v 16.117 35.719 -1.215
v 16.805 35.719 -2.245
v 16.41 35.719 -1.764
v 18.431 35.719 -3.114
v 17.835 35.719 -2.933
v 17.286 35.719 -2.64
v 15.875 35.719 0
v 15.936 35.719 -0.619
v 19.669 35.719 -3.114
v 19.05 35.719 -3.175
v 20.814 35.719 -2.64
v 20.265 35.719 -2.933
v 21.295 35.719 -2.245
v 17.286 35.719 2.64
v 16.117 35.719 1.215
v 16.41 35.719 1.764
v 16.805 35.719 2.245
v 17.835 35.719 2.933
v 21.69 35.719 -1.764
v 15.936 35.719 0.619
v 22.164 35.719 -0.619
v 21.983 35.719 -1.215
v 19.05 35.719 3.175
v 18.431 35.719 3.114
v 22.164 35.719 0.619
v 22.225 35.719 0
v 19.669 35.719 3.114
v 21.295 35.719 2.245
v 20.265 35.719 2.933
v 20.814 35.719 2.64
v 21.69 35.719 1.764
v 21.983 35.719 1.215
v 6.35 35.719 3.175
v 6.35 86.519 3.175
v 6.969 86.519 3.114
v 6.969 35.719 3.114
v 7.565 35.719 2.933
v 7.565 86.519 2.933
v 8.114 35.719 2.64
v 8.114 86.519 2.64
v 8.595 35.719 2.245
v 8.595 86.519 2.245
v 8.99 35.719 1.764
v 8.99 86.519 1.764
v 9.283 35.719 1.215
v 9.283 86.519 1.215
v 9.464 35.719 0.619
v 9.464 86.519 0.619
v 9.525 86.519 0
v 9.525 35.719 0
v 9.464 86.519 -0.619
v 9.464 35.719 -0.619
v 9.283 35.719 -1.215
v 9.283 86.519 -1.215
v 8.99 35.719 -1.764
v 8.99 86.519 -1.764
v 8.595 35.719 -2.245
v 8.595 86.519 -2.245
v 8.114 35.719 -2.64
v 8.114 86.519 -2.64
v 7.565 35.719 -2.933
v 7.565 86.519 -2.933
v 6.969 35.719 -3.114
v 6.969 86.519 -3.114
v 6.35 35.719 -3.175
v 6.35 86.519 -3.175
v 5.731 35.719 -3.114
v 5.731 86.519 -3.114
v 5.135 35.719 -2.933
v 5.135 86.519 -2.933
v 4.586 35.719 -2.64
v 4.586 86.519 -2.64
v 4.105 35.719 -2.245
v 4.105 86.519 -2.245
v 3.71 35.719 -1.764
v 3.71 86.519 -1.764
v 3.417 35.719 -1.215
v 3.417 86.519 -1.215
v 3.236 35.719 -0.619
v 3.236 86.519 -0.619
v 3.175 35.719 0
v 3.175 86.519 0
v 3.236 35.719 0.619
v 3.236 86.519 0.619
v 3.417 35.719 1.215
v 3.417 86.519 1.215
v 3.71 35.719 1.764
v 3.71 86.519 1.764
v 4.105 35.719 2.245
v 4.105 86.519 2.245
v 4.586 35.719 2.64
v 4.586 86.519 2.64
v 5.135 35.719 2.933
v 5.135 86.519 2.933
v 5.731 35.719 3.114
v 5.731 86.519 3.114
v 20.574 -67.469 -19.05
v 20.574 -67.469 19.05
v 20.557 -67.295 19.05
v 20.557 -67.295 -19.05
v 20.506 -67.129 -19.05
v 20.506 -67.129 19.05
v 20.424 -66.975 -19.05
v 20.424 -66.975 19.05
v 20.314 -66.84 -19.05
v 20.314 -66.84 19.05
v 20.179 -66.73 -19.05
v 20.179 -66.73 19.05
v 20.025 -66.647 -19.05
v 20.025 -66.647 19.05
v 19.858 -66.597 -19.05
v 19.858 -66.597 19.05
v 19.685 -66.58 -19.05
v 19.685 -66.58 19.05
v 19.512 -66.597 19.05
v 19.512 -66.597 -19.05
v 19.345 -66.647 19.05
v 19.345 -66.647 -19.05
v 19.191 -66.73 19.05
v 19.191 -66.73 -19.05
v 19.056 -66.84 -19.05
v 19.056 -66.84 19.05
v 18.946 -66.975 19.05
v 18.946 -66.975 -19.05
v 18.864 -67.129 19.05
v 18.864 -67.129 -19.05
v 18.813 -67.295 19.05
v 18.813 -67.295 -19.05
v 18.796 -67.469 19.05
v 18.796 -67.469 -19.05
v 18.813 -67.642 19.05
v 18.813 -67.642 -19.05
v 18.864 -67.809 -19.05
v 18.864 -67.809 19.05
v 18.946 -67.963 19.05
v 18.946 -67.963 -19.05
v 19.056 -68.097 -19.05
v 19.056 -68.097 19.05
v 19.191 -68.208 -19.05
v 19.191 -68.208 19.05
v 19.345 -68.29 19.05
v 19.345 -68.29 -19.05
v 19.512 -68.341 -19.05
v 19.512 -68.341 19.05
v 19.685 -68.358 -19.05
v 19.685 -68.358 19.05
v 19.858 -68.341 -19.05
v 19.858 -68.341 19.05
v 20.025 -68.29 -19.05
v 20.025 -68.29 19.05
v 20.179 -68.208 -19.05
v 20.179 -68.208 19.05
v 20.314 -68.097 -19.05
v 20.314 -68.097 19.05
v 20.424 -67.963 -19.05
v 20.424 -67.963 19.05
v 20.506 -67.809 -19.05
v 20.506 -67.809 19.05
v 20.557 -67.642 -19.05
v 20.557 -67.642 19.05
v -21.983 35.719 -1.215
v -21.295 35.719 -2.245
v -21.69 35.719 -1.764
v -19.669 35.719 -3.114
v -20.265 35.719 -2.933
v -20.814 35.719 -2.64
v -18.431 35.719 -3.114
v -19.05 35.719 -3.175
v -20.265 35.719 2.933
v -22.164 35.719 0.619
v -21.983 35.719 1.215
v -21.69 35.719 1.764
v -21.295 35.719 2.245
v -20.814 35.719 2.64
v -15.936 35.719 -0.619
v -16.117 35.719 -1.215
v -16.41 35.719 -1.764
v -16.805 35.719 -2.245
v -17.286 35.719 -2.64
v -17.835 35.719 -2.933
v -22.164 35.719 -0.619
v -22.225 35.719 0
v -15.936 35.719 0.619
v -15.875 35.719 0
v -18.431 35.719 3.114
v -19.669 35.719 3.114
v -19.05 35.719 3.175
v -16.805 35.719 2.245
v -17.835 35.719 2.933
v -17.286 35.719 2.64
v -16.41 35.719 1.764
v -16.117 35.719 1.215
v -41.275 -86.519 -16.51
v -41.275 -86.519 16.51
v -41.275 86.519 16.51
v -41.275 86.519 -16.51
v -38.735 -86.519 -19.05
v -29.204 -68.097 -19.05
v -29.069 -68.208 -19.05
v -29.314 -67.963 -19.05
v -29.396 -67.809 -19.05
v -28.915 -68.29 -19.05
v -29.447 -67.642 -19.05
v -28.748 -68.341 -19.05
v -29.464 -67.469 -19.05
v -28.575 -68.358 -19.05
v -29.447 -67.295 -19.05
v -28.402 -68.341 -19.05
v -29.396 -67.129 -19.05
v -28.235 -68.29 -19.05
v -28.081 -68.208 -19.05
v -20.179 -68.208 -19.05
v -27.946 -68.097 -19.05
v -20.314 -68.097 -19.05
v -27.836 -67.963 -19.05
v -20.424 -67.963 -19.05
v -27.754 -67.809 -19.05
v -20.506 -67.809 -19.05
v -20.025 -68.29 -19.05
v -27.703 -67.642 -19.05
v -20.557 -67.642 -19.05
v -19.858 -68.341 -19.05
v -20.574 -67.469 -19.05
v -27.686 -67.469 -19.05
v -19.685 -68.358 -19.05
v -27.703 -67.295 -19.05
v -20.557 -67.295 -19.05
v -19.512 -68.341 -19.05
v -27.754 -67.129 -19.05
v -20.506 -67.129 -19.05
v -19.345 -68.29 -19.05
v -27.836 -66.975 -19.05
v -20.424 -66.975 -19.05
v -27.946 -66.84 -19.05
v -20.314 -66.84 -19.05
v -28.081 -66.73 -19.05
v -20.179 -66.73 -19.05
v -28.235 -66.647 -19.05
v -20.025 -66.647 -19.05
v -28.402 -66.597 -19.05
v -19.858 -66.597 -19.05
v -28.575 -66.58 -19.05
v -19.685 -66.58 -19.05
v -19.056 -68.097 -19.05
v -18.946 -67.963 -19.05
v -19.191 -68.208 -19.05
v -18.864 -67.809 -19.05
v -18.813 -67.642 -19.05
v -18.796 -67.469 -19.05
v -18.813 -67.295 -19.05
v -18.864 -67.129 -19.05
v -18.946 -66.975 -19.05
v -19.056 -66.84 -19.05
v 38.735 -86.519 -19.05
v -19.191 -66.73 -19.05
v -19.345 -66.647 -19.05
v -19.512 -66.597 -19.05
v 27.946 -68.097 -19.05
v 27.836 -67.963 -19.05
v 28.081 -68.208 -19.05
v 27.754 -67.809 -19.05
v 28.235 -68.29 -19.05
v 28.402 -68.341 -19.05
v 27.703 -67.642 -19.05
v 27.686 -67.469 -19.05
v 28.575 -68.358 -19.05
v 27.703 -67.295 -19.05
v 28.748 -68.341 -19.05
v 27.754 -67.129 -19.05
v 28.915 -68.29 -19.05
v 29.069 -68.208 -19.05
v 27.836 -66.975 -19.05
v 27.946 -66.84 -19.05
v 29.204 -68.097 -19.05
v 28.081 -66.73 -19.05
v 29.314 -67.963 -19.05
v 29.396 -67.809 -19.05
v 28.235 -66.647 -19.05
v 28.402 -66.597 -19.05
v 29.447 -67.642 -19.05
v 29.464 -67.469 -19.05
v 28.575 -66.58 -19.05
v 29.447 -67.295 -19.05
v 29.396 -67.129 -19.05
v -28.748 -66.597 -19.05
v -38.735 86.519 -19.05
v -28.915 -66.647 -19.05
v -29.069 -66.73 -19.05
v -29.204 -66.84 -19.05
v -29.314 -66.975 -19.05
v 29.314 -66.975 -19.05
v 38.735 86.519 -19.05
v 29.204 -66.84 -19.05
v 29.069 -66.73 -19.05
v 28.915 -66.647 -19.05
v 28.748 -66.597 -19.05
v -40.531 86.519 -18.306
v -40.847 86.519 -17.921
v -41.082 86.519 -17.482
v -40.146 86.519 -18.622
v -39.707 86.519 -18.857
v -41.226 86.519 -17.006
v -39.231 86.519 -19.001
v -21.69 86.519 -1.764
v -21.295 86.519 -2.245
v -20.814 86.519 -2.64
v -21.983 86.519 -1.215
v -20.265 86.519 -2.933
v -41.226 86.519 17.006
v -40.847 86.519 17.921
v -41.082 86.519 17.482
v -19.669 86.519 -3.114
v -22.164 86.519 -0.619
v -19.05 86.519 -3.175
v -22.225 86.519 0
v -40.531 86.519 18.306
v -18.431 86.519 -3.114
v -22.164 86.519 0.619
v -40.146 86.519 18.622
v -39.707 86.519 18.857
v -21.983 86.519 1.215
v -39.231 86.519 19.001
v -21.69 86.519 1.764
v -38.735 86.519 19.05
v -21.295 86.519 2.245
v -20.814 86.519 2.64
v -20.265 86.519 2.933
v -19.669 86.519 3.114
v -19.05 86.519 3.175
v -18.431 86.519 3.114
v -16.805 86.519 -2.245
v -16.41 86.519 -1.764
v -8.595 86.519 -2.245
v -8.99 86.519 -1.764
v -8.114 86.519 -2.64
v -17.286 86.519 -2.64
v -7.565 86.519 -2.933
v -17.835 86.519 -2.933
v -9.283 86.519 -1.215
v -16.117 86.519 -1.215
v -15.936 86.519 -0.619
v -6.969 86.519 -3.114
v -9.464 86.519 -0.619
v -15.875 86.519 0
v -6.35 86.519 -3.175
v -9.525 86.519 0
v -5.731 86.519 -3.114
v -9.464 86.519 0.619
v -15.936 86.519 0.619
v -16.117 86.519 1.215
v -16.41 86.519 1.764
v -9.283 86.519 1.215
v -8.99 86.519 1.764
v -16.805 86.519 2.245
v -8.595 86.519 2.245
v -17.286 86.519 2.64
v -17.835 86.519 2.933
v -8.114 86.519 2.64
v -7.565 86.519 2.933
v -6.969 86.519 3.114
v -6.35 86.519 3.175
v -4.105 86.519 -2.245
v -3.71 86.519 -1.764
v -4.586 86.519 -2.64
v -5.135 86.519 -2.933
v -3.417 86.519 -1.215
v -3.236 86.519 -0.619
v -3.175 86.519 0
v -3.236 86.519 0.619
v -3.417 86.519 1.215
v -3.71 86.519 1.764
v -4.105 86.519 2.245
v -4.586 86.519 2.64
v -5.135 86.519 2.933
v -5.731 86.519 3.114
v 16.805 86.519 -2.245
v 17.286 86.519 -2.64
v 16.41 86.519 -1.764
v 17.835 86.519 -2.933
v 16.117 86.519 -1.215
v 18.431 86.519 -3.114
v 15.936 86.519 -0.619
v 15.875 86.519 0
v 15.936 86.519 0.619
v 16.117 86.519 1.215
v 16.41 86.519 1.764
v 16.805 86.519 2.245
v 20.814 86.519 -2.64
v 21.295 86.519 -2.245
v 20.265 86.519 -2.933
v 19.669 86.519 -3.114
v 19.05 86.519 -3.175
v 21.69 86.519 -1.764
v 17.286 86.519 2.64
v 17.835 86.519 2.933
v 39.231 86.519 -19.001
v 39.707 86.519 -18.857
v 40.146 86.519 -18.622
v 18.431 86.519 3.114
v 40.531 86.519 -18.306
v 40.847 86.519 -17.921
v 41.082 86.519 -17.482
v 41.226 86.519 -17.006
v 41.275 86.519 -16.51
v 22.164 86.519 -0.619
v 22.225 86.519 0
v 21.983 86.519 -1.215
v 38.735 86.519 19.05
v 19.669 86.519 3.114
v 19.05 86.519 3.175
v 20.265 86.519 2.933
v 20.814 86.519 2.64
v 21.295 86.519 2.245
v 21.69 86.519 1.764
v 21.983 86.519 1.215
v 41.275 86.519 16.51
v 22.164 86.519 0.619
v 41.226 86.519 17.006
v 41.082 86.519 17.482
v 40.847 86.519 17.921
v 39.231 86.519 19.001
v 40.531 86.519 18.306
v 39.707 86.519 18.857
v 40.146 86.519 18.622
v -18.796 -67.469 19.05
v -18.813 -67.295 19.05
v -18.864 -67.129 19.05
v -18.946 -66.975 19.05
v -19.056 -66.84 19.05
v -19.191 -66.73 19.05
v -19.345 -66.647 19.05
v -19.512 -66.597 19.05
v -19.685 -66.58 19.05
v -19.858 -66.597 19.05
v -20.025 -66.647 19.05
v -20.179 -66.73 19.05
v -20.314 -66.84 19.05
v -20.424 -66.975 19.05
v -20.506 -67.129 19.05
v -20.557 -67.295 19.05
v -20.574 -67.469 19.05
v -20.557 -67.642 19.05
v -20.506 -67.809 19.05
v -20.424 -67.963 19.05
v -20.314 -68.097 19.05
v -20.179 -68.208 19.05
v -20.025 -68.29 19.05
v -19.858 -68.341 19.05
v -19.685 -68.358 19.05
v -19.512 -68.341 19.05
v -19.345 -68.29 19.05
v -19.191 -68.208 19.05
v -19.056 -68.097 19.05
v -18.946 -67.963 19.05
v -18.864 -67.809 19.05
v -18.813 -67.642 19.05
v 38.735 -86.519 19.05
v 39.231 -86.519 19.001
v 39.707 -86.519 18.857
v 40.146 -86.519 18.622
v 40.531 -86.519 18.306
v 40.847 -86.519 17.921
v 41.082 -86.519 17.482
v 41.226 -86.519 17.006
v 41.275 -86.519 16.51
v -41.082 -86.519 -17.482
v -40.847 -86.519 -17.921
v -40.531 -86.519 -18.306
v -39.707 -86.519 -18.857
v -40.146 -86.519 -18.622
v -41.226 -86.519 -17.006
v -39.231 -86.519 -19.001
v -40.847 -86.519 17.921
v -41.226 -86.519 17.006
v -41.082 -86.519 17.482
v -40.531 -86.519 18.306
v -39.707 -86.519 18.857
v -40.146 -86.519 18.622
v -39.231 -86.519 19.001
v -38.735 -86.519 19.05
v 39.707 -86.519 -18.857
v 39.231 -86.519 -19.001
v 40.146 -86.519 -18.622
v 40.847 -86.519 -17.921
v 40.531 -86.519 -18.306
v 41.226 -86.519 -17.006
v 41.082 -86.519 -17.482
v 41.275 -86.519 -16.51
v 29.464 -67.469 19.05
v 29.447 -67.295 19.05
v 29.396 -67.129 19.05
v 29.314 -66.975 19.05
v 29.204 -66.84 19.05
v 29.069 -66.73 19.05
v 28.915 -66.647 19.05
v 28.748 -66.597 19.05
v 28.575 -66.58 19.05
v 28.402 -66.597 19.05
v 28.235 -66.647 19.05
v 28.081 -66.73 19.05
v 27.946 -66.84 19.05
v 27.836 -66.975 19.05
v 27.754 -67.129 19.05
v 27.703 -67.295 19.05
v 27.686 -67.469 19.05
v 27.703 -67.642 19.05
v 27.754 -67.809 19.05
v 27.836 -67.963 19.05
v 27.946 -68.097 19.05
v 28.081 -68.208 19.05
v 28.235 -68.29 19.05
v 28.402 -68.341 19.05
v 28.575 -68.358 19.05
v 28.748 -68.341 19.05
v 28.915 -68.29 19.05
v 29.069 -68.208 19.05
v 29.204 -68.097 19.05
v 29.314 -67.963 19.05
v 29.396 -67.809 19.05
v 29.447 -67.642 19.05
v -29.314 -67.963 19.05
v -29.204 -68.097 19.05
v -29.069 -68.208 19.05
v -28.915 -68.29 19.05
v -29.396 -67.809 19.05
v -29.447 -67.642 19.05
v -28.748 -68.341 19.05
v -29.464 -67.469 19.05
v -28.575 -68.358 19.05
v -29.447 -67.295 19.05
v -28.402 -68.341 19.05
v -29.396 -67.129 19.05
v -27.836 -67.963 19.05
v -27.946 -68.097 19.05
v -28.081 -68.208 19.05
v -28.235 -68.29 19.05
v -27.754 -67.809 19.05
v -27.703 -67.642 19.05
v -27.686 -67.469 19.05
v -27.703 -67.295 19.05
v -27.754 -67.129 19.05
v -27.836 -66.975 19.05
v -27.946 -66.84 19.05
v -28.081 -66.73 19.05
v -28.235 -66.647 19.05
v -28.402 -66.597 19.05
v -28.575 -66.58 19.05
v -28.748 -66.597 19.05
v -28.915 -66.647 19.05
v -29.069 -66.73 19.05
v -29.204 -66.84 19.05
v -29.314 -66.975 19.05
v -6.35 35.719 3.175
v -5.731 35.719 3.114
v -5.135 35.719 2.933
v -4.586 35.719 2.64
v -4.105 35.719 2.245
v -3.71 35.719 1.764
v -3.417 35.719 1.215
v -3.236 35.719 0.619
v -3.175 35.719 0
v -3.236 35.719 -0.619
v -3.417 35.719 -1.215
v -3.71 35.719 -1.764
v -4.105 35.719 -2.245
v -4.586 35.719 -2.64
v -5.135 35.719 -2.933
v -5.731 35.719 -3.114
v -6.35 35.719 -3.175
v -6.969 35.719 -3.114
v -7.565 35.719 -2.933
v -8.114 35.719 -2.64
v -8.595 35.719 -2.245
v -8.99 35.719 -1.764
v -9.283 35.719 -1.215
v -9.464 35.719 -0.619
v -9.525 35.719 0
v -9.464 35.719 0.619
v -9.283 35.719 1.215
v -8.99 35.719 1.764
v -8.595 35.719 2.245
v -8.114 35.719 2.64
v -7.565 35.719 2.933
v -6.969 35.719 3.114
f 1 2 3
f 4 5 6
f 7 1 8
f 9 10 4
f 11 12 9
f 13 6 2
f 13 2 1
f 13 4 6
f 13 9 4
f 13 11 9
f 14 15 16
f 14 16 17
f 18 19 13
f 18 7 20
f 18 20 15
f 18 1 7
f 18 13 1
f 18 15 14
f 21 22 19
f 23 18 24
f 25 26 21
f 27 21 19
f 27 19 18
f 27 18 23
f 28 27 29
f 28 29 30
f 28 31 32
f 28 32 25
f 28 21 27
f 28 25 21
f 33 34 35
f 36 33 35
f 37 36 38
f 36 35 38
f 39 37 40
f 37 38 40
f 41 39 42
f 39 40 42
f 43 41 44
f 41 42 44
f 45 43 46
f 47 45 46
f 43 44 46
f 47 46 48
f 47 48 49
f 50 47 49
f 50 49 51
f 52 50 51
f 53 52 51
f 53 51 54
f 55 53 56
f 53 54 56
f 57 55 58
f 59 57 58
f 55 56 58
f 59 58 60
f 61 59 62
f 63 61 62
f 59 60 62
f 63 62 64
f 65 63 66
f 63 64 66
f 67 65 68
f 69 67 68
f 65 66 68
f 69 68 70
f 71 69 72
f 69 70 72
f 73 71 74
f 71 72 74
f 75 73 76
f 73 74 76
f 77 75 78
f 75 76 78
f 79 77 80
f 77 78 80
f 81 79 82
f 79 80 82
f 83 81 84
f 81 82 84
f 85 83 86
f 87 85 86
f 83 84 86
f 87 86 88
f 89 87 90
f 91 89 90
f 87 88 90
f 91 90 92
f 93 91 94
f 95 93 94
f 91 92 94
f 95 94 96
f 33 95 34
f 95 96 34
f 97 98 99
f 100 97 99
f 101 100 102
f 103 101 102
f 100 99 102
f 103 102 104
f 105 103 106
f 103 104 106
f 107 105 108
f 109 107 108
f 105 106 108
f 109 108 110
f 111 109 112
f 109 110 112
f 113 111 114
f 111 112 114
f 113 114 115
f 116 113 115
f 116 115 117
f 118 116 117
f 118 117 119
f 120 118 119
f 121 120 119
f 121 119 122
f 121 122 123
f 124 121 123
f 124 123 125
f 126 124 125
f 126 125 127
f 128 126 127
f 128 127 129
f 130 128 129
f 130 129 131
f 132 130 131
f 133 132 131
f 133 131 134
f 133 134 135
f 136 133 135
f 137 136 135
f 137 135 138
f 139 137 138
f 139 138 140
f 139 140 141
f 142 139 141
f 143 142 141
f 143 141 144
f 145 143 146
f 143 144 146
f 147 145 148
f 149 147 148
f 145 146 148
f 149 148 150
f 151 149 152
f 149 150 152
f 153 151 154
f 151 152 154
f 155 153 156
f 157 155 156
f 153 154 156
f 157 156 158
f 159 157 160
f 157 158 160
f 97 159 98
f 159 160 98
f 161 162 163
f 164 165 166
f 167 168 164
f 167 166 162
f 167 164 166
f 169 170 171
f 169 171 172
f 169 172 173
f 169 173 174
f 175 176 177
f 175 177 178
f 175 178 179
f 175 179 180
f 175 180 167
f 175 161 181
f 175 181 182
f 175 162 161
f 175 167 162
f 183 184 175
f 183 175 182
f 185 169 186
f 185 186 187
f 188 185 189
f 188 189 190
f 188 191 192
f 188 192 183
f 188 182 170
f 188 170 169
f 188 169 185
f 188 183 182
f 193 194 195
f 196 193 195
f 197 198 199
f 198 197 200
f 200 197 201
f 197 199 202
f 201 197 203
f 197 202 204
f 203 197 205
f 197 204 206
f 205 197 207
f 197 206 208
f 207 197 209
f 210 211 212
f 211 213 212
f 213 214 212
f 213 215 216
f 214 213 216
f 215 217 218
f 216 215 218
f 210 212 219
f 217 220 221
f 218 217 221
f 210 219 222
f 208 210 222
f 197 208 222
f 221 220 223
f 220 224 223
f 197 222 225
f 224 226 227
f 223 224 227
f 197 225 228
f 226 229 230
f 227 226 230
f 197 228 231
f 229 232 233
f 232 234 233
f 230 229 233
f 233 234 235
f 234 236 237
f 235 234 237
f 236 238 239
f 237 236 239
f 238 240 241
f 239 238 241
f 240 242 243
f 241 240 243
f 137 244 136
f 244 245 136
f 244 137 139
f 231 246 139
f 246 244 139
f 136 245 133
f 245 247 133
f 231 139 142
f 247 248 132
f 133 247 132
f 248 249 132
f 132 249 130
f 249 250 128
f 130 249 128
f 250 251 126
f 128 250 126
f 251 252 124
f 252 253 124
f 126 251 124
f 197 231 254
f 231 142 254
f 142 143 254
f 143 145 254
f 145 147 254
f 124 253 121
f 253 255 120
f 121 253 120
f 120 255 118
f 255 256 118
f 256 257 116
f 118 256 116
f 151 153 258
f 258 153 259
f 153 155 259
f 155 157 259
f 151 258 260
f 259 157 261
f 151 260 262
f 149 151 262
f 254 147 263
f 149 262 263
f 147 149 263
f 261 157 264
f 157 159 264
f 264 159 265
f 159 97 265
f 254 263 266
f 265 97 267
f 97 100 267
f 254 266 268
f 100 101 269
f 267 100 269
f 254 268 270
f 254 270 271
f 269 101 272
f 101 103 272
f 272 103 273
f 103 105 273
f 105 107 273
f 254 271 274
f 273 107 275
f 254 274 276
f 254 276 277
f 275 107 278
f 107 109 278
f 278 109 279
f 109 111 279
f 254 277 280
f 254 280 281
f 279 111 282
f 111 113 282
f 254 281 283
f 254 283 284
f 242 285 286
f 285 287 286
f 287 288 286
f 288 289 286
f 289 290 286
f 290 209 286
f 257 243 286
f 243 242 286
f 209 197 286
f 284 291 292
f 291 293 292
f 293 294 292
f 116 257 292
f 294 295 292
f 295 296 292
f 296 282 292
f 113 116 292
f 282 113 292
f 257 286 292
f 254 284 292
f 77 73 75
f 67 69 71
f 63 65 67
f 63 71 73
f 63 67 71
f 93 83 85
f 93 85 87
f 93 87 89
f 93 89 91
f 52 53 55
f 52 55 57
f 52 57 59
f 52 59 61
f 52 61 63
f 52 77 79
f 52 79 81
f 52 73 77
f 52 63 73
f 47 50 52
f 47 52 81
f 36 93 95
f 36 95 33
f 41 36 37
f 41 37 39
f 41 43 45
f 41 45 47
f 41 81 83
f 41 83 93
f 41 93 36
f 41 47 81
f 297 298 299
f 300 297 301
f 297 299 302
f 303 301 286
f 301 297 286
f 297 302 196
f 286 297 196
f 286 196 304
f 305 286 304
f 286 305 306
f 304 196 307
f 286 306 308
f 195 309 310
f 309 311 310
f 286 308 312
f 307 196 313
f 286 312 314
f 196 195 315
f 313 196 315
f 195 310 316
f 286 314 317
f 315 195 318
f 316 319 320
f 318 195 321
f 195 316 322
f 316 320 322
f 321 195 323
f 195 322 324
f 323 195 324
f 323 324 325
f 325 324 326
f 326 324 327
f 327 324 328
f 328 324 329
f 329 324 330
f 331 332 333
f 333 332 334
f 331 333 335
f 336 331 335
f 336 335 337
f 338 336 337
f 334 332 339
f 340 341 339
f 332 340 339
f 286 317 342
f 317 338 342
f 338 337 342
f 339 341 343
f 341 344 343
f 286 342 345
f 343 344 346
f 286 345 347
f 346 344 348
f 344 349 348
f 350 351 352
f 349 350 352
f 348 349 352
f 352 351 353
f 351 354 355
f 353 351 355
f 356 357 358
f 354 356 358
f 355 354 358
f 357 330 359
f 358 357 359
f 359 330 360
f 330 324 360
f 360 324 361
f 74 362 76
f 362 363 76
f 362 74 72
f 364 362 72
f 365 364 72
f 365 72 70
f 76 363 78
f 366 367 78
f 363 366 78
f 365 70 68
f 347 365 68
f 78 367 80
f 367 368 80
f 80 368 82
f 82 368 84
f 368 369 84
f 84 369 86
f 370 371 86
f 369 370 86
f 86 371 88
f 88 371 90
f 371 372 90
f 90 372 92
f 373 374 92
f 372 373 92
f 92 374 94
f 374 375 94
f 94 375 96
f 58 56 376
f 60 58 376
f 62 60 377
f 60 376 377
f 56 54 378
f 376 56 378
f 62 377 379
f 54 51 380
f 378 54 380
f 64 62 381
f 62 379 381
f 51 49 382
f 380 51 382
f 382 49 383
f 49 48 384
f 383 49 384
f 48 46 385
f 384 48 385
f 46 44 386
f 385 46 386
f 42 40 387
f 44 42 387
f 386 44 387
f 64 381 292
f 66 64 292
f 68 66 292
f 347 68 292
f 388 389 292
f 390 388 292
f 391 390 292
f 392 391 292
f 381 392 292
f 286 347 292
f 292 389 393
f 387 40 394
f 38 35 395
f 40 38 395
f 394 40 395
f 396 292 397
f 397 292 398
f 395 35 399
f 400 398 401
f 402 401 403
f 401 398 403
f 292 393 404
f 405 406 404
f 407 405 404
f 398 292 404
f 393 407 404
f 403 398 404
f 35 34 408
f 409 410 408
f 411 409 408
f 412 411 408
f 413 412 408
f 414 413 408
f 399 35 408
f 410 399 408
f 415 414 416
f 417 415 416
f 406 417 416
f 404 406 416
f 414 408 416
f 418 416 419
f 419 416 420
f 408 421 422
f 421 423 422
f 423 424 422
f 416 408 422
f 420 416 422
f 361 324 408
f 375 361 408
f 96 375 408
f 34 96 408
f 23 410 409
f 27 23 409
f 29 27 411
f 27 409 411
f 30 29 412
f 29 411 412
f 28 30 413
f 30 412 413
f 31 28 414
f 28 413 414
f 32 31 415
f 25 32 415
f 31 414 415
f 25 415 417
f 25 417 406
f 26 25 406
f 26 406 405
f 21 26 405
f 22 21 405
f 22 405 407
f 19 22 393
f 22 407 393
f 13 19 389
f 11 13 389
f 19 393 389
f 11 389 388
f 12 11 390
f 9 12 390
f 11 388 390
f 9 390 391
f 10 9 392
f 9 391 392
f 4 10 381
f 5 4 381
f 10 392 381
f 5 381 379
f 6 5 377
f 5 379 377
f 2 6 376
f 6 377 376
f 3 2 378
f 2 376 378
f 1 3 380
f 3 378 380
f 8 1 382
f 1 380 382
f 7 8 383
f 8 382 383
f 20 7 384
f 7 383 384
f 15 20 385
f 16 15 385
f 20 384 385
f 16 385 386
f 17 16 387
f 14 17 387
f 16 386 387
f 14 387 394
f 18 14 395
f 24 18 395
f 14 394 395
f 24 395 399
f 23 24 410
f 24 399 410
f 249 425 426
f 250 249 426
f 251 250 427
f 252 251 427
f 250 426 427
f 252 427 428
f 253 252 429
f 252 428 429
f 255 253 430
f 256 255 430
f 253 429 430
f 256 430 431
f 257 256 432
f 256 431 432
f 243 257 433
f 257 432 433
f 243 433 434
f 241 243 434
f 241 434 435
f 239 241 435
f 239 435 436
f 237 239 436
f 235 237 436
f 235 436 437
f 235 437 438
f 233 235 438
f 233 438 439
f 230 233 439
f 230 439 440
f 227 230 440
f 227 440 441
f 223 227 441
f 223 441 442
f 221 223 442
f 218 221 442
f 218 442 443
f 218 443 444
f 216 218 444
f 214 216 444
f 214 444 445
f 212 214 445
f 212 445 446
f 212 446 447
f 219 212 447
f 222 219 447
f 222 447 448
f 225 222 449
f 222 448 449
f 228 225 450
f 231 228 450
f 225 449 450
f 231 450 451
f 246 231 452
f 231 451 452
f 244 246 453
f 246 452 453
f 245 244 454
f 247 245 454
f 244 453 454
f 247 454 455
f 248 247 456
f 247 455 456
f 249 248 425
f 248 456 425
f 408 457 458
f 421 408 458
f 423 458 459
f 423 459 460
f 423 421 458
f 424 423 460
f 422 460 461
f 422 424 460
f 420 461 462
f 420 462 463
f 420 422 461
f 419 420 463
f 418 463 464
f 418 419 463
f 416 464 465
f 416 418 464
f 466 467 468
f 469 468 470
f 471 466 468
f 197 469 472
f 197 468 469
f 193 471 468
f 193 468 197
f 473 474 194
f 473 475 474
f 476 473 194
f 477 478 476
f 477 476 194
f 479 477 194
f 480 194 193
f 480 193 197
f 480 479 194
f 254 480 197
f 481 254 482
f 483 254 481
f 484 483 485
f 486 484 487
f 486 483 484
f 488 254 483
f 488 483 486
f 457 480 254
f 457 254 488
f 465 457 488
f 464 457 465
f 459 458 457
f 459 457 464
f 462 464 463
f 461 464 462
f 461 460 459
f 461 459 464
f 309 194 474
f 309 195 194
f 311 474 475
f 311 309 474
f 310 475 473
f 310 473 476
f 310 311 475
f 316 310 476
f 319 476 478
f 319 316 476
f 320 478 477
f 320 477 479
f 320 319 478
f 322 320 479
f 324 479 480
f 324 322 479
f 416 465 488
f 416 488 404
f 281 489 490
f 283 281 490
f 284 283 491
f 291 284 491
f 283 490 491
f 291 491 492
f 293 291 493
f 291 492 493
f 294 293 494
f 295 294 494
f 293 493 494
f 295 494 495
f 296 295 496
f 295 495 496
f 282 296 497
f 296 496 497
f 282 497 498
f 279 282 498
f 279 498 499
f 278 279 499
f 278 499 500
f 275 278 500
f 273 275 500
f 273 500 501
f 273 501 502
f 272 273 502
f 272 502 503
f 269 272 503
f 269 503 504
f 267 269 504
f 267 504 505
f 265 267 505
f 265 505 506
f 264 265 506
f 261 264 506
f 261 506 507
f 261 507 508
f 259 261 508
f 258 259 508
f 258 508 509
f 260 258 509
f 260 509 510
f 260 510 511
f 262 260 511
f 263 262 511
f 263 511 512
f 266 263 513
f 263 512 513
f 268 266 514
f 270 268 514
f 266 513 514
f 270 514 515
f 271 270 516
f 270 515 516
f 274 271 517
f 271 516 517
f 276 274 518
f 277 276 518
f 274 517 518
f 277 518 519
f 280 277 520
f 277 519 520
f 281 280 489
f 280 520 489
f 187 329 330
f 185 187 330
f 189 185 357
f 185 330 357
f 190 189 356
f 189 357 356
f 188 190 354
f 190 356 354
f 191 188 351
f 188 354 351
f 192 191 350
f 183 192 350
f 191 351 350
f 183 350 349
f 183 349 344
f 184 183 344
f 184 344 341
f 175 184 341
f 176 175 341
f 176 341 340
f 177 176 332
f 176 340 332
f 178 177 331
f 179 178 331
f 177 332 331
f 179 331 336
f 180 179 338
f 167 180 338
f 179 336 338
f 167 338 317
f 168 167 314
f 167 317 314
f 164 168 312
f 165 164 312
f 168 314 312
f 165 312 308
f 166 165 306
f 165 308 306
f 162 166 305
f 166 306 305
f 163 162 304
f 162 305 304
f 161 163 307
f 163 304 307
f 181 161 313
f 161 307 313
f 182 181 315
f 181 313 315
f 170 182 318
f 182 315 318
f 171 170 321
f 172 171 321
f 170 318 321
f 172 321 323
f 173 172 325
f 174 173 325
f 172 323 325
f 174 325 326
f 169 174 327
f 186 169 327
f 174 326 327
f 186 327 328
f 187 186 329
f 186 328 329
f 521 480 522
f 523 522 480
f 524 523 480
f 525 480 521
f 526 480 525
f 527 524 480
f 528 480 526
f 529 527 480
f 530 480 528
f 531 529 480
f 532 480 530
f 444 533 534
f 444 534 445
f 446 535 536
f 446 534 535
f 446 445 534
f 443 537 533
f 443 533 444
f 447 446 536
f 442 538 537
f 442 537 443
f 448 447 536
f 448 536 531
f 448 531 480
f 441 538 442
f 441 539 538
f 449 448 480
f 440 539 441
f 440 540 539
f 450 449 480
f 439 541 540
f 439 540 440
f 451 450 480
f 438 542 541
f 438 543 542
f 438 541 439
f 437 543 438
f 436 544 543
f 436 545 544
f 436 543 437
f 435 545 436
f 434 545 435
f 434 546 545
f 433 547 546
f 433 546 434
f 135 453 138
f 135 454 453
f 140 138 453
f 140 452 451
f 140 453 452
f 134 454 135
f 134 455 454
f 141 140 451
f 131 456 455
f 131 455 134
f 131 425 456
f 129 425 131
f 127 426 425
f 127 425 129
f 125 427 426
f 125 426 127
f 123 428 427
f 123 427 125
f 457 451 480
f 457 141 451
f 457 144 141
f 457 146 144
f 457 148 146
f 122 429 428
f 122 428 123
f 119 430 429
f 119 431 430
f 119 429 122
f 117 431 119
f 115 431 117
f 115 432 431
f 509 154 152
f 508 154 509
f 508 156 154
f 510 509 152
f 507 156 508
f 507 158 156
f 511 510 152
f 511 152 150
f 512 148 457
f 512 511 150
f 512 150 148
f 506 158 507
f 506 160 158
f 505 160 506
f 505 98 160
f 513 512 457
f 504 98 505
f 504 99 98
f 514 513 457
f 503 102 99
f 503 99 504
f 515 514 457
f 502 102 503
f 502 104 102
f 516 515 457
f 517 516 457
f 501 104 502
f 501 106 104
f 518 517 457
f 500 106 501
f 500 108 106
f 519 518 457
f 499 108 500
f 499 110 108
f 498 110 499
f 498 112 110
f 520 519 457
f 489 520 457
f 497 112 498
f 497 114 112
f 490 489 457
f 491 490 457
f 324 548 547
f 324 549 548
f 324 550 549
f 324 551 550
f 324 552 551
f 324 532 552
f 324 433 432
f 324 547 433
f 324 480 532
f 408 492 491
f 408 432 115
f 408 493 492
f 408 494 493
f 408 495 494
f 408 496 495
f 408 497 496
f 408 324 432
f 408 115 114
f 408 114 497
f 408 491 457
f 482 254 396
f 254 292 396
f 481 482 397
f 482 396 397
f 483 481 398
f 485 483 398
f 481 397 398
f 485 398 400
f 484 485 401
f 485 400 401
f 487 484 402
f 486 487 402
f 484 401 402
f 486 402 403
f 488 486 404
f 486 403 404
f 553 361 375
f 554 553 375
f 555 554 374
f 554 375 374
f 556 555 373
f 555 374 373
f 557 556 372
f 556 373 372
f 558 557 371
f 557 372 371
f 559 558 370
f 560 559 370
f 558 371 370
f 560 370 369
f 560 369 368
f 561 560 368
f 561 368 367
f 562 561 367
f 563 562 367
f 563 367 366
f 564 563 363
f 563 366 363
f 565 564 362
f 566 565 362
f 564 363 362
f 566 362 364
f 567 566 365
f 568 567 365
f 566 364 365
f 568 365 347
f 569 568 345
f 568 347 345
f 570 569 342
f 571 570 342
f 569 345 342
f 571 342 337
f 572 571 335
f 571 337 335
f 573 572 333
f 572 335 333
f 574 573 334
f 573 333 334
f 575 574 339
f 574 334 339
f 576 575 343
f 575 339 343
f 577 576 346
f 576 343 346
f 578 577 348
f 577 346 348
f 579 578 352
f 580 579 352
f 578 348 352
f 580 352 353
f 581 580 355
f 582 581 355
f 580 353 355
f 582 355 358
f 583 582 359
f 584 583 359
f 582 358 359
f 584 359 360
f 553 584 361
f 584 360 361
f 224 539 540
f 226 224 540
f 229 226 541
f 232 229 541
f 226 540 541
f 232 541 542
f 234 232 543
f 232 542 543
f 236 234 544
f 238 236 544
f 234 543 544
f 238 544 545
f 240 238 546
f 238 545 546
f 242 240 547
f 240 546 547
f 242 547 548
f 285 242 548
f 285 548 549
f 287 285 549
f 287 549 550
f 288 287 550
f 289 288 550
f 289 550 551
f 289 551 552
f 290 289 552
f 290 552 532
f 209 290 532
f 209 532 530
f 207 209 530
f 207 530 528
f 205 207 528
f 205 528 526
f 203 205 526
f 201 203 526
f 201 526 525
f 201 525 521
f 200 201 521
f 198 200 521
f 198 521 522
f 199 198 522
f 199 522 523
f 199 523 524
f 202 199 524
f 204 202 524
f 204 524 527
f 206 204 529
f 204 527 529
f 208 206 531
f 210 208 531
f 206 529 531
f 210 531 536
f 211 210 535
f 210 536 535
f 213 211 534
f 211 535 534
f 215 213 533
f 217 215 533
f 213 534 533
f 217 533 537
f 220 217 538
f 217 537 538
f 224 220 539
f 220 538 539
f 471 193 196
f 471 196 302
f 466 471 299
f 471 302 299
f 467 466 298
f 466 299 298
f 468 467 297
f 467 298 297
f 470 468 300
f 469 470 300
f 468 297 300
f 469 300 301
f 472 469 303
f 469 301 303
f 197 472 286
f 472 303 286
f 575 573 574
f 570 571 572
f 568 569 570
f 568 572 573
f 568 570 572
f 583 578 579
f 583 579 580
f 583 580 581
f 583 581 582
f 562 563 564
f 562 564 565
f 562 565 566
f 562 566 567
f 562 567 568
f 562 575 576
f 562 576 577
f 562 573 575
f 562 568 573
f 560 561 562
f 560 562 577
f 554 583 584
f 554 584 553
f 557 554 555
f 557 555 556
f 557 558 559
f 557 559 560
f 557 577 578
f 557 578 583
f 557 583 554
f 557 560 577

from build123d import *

# Parameters (mm, degrees)
SKETCH1_W           = 82.55
SKETCH1_H           = 173.0375
BOSS_EXTRUDE1_DEPTH = 19.05
SKETCH2_R           = 0.889
CUT_EXTRUDE1_DEPTH  = 104.153912803
FILLET1_R           = 2.54
SKETCH3_R           = 3.175
CUT_EXTRUDE2_DEPTH  = 50.8


with BuildPart() as part:
    # Sketch1 → Boss-Extrude1 (new, symmetric)
    with BuildSketch(Plane.XY):
        Rectangle(SKETCH1_W, SKETCH1_H)
    extrude(amount=BOSS_EXTRUDE1_DEPTH, both=True)

    # Sketch2 → Cut-Extrude1 (cut, through all)
    with BuildSketch(Plane.XY.offset(19.05)):
        with Locations((-28.575, -67.46875)):
            Circle(SKETCH2_R)
        with Locations((-19.685, -67.46875)):
            Circle(SKETCH2_R)
        with Locations((28.575, -67.46875)):
            Circle(SKETCH2_R)
        with Locations((19.685, -67.46875)):
            Circle(SKETCH2_R)
    extrude(amount=-CUT_EXTRUDE1_DEPTH, mode=Mode.SUBTRACT)

    # Fillet1
    fillet1_edges = [part.edges().sort_by_distance(p)[0] for p in [
        (-41.275, 0, 19.05),
        (41.275, 0, 19.05),
        (-41.275, 0, -19.05),
        (41.275, 0, -19.05),
    ]]
    fillet(fillet1_edges, radius=FILLET1_R)

    # Sketch3 → Cut-Extrude2 (cut)
    with BuildSketch(Plane(origin=(0, 86.51875, 0), x_dir=(1, 0, 0), z_dir=(0, 1, 0))):
        with Locations(Location((19.05, 0, 0), (0, 0, 270))):
            Circle(SKETCH3_R)
        with Locations(Location((-19.05, 0, 0), (0, 0, 270))):
            Circle(SKETCH3_R)
        with Locations(Location((-6.35, 0, 0), (0, 0, 270))):
            Circle(SKETCH3_R)
        with Locations(Location((6.35, 0, 0), (0, 0, 270))):
            Circle(SKETCH3_R)
    extrude(amount=-CUT_EXTRUDE2_DEPTH, mode=Mode.SUBTRACT)


solid = part.part
